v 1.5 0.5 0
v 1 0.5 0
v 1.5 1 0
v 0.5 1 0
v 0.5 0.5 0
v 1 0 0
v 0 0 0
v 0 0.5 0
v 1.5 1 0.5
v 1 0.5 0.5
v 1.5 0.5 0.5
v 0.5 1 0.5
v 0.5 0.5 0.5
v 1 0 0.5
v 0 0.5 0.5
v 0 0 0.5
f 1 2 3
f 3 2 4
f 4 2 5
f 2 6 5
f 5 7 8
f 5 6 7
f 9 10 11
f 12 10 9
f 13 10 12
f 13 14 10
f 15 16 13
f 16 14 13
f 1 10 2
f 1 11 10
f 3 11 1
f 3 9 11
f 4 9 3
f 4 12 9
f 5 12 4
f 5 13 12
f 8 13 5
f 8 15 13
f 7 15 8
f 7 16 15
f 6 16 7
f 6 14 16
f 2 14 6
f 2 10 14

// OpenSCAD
// Tetromino (S) for Stacks of Shapes
// by Slashee the Cow
linear_extrude(0.5)
polygon([[0,0],[1,0],[1,0.5],[1.5,0.5],[1.5,1],[0.5,1],[0.5,0.5],[0,0.5]]);
